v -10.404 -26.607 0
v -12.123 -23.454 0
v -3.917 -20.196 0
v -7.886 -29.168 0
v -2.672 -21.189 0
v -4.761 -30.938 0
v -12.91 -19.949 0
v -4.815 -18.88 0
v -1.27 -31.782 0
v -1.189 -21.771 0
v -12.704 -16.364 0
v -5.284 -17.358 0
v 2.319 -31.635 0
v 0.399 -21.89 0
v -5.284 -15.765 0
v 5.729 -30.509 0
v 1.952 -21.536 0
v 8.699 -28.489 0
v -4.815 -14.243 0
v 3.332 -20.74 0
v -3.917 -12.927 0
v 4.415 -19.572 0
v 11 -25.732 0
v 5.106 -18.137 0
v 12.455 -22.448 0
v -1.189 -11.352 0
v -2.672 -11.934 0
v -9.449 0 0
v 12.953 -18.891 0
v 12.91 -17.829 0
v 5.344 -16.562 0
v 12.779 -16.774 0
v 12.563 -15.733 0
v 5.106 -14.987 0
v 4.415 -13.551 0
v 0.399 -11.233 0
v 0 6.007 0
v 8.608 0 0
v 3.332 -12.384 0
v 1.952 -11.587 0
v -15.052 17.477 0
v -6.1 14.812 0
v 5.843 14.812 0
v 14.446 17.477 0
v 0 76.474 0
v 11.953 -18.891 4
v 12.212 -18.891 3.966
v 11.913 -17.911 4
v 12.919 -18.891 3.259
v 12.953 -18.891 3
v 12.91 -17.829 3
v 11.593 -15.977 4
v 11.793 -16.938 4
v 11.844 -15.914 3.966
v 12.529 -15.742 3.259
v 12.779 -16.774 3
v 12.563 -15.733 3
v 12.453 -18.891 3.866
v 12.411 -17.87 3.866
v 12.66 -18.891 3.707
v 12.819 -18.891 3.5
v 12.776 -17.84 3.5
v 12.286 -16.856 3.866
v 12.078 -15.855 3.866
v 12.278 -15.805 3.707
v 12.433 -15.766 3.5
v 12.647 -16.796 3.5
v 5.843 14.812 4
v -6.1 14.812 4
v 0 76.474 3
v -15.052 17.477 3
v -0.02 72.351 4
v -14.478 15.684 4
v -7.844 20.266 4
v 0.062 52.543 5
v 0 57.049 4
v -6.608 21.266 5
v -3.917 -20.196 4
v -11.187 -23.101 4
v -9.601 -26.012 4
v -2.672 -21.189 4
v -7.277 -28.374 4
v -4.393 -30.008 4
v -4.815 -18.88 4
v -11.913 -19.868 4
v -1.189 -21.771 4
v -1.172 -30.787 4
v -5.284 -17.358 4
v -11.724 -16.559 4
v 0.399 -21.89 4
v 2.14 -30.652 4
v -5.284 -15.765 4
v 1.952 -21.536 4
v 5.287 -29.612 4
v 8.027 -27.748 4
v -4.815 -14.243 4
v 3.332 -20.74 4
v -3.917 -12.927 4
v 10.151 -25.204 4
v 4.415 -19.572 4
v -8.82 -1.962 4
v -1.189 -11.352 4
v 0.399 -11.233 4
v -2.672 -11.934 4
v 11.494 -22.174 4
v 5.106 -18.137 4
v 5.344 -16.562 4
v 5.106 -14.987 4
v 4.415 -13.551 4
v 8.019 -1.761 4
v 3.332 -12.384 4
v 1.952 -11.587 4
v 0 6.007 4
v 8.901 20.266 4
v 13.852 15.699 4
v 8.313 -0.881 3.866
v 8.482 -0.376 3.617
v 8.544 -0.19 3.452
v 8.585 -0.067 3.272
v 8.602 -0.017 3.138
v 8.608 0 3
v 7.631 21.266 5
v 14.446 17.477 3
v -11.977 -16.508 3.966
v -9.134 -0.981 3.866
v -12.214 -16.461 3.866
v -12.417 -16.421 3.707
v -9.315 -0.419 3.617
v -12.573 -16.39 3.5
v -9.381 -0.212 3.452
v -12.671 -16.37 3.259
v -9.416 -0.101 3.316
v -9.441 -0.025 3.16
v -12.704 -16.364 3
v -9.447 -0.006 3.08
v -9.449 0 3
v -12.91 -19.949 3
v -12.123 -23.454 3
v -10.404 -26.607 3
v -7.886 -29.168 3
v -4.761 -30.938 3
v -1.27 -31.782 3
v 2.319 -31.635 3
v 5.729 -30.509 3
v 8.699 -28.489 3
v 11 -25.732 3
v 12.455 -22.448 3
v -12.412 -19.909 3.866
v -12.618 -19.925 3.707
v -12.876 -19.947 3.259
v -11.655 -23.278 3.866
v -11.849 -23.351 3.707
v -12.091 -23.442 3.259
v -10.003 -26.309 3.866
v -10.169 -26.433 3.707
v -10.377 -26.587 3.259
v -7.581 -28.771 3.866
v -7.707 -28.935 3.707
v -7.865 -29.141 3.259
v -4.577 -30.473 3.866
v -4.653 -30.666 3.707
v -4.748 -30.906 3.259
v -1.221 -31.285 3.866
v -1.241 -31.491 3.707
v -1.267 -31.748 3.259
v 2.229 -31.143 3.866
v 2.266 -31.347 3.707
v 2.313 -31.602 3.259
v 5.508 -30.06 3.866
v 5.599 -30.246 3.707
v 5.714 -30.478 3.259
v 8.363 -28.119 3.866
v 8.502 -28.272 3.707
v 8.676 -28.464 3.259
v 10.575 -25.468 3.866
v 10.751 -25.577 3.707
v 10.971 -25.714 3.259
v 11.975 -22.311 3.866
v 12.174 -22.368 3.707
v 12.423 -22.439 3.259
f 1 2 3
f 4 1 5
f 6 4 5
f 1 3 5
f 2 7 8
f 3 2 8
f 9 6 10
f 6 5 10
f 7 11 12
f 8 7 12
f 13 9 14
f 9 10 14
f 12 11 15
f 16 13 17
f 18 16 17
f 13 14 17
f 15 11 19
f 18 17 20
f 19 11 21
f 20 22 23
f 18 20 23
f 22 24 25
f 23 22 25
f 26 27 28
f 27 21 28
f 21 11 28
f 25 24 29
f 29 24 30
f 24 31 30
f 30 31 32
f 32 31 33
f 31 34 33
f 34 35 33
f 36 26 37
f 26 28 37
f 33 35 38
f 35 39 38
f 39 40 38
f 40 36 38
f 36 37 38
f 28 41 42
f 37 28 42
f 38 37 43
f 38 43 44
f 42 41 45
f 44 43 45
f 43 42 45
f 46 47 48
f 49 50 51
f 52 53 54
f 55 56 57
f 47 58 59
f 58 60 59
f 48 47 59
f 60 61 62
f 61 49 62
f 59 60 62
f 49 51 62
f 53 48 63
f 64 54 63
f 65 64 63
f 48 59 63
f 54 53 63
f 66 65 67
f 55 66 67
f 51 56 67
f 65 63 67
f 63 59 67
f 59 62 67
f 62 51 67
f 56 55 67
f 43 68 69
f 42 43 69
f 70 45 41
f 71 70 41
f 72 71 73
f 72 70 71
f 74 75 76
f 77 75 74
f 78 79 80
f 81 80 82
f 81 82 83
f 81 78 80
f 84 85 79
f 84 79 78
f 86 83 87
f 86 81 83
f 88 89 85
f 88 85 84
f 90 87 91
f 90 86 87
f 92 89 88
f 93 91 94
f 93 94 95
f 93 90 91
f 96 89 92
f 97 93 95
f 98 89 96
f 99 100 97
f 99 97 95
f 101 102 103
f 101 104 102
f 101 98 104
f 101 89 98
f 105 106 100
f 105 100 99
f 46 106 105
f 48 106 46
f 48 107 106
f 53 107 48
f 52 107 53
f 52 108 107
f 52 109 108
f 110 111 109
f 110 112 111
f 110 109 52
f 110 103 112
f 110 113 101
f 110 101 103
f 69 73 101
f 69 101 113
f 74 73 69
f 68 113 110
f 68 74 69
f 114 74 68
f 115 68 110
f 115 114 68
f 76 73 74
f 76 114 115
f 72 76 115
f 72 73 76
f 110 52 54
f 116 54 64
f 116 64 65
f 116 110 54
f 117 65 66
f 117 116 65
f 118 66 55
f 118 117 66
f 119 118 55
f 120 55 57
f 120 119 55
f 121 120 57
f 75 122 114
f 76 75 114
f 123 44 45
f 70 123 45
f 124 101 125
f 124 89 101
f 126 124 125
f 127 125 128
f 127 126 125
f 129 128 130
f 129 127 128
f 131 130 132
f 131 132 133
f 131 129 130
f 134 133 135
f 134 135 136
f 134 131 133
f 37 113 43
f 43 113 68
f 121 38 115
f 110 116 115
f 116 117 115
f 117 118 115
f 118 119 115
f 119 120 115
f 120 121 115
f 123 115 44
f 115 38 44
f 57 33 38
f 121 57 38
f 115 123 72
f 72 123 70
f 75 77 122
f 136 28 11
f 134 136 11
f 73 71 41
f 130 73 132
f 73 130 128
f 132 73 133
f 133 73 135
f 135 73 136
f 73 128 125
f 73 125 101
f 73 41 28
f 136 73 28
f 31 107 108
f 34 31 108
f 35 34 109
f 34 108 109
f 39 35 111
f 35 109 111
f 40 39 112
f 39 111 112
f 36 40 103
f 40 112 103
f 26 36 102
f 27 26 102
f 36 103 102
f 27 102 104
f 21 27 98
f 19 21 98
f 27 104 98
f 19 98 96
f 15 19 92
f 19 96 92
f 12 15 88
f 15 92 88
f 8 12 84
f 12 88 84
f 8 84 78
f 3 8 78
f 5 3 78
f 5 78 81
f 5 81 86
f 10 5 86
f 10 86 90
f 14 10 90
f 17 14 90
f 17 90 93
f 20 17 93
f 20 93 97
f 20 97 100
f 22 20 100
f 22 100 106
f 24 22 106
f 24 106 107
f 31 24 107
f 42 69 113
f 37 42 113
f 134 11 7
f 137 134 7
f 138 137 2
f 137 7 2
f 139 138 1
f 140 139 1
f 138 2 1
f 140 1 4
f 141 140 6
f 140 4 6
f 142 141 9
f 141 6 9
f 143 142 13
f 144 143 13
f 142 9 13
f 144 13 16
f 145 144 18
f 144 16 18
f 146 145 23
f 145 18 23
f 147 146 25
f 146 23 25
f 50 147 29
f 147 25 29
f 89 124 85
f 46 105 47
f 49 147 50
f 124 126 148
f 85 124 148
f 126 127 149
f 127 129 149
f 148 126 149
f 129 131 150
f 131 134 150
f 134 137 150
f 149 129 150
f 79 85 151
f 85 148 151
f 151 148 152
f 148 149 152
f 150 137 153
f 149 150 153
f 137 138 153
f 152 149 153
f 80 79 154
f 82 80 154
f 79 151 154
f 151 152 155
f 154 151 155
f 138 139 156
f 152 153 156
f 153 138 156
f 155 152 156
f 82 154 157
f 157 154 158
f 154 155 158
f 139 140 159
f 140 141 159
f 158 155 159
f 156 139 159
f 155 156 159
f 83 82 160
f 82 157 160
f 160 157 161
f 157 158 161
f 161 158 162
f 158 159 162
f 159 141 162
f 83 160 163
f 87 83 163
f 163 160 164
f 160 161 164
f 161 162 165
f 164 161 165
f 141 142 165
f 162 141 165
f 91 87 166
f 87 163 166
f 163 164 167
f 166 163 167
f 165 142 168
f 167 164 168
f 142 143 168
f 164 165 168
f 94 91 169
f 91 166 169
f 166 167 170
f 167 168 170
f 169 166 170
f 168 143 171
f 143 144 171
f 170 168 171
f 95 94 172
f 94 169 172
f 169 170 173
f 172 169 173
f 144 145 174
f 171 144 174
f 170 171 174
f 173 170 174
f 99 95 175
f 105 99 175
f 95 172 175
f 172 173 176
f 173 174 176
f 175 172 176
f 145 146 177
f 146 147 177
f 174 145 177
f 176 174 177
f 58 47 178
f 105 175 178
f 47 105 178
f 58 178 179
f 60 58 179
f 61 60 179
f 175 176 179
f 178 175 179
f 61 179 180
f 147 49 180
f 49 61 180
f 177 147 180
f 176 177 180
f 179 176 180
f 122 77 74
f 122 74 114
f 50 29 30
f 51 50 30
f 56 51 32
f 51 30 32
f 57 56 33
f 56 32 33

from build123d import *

# Parameters (mm, degrees)
F1_DEPTH = 4
F2_R     = 5.3437499794
F3_DEPTH = 25.4
F5_DEPTH = 25.4
F7_DEPTH = 1
F8_SIZE  = 0.99999
F9_SIZE  = 0.99999
F10_SIZE = 1
F11_R    = 1


# Not quite as in the source:
# - a fillet or chamfer is up to 0.001 mm smaller than in the source, because OpenCascade refuses the exact size


with BuildPart() as f1:
    # F0 (on Top) → F1 (new body)
    with BuildSketch(Plane.XY):
        Polygon((0, 76.4742046595), (-15.0523874909, 17.476933077), (14.446250163, 17.476933077), align=None)
        with BuildLine():
            Line((14.446250163, 17.476933077), (-15.0523874909, 17.476933077))
            Line((-15.0523874909, 17.476933077), (-9.4487972359, 0))
            Line((-9.4487972359, 0), (-12.7043901229, -16.3636804159))
            ThreePointArc((-12.7043901229, -16.3636804159), (-0.3230678893, -5.9418952878), (12.5625447422, -15.7333064535))
            Line((12.5625447422, -15.7333064535), (8.6075438617, 0))
            Line((8.6075438617, 0), (14.446250163, 17.476933077))
        make_face()
        with BuildLine():
            ThreePointArc((12.5625447422, -15.7333064535), (-0.3230678893, -5.9418952878), (-12.7043901229, -16.3636804159))
            ThreePointArc((-12.7043901229, -16.3636804159), (-1.2699015357, -31.782233325), (12.9533829787, -18.891248852))
            ThreePointArc((12.9533829787, -18.891248852), (12.8553020934, -17.3002307252), (12.5625447422, -15.7333064535))
        make_face()
    extrude(amount=F1_DEPTH)

    # F2 (on face) → F3 (cut)
    with BuildSketch(Plane.XY.offset(4)):
        with Locations((0, -16.5616404265)):
            Circle(F2_R)
    extrude(amount=-F3_DEPTH, mode=Mode.SUBTRACT)

    # F4 (on face) → F5 (cut)
    with BuildSketch(Plane.XY.offset(4)):
        Polygon((-6.0996017419, 14.8122329265), (0, 6.0074422508), (5.8425283059, 14.8122329265), align=None)
    extrude(amount=-F5_DEPTH, mode=Mode.SUBTRACT)

    # F6 (on face) → F7 (join)
    with BuildSketch(Plane.XY.offset(4)):
        Polygon((0, 57.0488348603), (-7.8442301601, 20.2657673508), (8.901366964, 20.2657673508), align=None)
    extrude(amount=F7_DEPTH)

    # F8 (size 1 in the source; OpenCascade refuses exactly that, so slightly less here)
    f8_edges = [f1.edges().sort_by_distance(p)[0] for p in [
        (-3.922115, 38.657301, 5),
        (4.450683, 38.657301, 5),
    ]]
    chamfer(f8_edges, length=F8_SIZE)

    # F9 (size 1 in the source; OpenCascade refuses exactly that, so slightly less here)
    f9_edges = [f1.edges().sort_by_distance(p)[0] for p in [
        (0.525379, 20.265767, 5),
    ]]
    chamfer(f9_edges, length=F9_SIZE)

    # F10
    f10_edges = [f1.edges().sort_by_distance(p)[0] for p in [
        (-7.526194, 46.975569, 4),
        (7.223125, 46.975569, 4),
    ]]
    chamfer(f10_edges, length=F10_SIZE)

    # F11
    f11_edges = [f1.edges().sort_by_distance(p)[0] for p in [
        (0.323068, -31.840602, 4),
    ]]
    fillet(f11_edges, radius=F11_R)


solid = f1.part
